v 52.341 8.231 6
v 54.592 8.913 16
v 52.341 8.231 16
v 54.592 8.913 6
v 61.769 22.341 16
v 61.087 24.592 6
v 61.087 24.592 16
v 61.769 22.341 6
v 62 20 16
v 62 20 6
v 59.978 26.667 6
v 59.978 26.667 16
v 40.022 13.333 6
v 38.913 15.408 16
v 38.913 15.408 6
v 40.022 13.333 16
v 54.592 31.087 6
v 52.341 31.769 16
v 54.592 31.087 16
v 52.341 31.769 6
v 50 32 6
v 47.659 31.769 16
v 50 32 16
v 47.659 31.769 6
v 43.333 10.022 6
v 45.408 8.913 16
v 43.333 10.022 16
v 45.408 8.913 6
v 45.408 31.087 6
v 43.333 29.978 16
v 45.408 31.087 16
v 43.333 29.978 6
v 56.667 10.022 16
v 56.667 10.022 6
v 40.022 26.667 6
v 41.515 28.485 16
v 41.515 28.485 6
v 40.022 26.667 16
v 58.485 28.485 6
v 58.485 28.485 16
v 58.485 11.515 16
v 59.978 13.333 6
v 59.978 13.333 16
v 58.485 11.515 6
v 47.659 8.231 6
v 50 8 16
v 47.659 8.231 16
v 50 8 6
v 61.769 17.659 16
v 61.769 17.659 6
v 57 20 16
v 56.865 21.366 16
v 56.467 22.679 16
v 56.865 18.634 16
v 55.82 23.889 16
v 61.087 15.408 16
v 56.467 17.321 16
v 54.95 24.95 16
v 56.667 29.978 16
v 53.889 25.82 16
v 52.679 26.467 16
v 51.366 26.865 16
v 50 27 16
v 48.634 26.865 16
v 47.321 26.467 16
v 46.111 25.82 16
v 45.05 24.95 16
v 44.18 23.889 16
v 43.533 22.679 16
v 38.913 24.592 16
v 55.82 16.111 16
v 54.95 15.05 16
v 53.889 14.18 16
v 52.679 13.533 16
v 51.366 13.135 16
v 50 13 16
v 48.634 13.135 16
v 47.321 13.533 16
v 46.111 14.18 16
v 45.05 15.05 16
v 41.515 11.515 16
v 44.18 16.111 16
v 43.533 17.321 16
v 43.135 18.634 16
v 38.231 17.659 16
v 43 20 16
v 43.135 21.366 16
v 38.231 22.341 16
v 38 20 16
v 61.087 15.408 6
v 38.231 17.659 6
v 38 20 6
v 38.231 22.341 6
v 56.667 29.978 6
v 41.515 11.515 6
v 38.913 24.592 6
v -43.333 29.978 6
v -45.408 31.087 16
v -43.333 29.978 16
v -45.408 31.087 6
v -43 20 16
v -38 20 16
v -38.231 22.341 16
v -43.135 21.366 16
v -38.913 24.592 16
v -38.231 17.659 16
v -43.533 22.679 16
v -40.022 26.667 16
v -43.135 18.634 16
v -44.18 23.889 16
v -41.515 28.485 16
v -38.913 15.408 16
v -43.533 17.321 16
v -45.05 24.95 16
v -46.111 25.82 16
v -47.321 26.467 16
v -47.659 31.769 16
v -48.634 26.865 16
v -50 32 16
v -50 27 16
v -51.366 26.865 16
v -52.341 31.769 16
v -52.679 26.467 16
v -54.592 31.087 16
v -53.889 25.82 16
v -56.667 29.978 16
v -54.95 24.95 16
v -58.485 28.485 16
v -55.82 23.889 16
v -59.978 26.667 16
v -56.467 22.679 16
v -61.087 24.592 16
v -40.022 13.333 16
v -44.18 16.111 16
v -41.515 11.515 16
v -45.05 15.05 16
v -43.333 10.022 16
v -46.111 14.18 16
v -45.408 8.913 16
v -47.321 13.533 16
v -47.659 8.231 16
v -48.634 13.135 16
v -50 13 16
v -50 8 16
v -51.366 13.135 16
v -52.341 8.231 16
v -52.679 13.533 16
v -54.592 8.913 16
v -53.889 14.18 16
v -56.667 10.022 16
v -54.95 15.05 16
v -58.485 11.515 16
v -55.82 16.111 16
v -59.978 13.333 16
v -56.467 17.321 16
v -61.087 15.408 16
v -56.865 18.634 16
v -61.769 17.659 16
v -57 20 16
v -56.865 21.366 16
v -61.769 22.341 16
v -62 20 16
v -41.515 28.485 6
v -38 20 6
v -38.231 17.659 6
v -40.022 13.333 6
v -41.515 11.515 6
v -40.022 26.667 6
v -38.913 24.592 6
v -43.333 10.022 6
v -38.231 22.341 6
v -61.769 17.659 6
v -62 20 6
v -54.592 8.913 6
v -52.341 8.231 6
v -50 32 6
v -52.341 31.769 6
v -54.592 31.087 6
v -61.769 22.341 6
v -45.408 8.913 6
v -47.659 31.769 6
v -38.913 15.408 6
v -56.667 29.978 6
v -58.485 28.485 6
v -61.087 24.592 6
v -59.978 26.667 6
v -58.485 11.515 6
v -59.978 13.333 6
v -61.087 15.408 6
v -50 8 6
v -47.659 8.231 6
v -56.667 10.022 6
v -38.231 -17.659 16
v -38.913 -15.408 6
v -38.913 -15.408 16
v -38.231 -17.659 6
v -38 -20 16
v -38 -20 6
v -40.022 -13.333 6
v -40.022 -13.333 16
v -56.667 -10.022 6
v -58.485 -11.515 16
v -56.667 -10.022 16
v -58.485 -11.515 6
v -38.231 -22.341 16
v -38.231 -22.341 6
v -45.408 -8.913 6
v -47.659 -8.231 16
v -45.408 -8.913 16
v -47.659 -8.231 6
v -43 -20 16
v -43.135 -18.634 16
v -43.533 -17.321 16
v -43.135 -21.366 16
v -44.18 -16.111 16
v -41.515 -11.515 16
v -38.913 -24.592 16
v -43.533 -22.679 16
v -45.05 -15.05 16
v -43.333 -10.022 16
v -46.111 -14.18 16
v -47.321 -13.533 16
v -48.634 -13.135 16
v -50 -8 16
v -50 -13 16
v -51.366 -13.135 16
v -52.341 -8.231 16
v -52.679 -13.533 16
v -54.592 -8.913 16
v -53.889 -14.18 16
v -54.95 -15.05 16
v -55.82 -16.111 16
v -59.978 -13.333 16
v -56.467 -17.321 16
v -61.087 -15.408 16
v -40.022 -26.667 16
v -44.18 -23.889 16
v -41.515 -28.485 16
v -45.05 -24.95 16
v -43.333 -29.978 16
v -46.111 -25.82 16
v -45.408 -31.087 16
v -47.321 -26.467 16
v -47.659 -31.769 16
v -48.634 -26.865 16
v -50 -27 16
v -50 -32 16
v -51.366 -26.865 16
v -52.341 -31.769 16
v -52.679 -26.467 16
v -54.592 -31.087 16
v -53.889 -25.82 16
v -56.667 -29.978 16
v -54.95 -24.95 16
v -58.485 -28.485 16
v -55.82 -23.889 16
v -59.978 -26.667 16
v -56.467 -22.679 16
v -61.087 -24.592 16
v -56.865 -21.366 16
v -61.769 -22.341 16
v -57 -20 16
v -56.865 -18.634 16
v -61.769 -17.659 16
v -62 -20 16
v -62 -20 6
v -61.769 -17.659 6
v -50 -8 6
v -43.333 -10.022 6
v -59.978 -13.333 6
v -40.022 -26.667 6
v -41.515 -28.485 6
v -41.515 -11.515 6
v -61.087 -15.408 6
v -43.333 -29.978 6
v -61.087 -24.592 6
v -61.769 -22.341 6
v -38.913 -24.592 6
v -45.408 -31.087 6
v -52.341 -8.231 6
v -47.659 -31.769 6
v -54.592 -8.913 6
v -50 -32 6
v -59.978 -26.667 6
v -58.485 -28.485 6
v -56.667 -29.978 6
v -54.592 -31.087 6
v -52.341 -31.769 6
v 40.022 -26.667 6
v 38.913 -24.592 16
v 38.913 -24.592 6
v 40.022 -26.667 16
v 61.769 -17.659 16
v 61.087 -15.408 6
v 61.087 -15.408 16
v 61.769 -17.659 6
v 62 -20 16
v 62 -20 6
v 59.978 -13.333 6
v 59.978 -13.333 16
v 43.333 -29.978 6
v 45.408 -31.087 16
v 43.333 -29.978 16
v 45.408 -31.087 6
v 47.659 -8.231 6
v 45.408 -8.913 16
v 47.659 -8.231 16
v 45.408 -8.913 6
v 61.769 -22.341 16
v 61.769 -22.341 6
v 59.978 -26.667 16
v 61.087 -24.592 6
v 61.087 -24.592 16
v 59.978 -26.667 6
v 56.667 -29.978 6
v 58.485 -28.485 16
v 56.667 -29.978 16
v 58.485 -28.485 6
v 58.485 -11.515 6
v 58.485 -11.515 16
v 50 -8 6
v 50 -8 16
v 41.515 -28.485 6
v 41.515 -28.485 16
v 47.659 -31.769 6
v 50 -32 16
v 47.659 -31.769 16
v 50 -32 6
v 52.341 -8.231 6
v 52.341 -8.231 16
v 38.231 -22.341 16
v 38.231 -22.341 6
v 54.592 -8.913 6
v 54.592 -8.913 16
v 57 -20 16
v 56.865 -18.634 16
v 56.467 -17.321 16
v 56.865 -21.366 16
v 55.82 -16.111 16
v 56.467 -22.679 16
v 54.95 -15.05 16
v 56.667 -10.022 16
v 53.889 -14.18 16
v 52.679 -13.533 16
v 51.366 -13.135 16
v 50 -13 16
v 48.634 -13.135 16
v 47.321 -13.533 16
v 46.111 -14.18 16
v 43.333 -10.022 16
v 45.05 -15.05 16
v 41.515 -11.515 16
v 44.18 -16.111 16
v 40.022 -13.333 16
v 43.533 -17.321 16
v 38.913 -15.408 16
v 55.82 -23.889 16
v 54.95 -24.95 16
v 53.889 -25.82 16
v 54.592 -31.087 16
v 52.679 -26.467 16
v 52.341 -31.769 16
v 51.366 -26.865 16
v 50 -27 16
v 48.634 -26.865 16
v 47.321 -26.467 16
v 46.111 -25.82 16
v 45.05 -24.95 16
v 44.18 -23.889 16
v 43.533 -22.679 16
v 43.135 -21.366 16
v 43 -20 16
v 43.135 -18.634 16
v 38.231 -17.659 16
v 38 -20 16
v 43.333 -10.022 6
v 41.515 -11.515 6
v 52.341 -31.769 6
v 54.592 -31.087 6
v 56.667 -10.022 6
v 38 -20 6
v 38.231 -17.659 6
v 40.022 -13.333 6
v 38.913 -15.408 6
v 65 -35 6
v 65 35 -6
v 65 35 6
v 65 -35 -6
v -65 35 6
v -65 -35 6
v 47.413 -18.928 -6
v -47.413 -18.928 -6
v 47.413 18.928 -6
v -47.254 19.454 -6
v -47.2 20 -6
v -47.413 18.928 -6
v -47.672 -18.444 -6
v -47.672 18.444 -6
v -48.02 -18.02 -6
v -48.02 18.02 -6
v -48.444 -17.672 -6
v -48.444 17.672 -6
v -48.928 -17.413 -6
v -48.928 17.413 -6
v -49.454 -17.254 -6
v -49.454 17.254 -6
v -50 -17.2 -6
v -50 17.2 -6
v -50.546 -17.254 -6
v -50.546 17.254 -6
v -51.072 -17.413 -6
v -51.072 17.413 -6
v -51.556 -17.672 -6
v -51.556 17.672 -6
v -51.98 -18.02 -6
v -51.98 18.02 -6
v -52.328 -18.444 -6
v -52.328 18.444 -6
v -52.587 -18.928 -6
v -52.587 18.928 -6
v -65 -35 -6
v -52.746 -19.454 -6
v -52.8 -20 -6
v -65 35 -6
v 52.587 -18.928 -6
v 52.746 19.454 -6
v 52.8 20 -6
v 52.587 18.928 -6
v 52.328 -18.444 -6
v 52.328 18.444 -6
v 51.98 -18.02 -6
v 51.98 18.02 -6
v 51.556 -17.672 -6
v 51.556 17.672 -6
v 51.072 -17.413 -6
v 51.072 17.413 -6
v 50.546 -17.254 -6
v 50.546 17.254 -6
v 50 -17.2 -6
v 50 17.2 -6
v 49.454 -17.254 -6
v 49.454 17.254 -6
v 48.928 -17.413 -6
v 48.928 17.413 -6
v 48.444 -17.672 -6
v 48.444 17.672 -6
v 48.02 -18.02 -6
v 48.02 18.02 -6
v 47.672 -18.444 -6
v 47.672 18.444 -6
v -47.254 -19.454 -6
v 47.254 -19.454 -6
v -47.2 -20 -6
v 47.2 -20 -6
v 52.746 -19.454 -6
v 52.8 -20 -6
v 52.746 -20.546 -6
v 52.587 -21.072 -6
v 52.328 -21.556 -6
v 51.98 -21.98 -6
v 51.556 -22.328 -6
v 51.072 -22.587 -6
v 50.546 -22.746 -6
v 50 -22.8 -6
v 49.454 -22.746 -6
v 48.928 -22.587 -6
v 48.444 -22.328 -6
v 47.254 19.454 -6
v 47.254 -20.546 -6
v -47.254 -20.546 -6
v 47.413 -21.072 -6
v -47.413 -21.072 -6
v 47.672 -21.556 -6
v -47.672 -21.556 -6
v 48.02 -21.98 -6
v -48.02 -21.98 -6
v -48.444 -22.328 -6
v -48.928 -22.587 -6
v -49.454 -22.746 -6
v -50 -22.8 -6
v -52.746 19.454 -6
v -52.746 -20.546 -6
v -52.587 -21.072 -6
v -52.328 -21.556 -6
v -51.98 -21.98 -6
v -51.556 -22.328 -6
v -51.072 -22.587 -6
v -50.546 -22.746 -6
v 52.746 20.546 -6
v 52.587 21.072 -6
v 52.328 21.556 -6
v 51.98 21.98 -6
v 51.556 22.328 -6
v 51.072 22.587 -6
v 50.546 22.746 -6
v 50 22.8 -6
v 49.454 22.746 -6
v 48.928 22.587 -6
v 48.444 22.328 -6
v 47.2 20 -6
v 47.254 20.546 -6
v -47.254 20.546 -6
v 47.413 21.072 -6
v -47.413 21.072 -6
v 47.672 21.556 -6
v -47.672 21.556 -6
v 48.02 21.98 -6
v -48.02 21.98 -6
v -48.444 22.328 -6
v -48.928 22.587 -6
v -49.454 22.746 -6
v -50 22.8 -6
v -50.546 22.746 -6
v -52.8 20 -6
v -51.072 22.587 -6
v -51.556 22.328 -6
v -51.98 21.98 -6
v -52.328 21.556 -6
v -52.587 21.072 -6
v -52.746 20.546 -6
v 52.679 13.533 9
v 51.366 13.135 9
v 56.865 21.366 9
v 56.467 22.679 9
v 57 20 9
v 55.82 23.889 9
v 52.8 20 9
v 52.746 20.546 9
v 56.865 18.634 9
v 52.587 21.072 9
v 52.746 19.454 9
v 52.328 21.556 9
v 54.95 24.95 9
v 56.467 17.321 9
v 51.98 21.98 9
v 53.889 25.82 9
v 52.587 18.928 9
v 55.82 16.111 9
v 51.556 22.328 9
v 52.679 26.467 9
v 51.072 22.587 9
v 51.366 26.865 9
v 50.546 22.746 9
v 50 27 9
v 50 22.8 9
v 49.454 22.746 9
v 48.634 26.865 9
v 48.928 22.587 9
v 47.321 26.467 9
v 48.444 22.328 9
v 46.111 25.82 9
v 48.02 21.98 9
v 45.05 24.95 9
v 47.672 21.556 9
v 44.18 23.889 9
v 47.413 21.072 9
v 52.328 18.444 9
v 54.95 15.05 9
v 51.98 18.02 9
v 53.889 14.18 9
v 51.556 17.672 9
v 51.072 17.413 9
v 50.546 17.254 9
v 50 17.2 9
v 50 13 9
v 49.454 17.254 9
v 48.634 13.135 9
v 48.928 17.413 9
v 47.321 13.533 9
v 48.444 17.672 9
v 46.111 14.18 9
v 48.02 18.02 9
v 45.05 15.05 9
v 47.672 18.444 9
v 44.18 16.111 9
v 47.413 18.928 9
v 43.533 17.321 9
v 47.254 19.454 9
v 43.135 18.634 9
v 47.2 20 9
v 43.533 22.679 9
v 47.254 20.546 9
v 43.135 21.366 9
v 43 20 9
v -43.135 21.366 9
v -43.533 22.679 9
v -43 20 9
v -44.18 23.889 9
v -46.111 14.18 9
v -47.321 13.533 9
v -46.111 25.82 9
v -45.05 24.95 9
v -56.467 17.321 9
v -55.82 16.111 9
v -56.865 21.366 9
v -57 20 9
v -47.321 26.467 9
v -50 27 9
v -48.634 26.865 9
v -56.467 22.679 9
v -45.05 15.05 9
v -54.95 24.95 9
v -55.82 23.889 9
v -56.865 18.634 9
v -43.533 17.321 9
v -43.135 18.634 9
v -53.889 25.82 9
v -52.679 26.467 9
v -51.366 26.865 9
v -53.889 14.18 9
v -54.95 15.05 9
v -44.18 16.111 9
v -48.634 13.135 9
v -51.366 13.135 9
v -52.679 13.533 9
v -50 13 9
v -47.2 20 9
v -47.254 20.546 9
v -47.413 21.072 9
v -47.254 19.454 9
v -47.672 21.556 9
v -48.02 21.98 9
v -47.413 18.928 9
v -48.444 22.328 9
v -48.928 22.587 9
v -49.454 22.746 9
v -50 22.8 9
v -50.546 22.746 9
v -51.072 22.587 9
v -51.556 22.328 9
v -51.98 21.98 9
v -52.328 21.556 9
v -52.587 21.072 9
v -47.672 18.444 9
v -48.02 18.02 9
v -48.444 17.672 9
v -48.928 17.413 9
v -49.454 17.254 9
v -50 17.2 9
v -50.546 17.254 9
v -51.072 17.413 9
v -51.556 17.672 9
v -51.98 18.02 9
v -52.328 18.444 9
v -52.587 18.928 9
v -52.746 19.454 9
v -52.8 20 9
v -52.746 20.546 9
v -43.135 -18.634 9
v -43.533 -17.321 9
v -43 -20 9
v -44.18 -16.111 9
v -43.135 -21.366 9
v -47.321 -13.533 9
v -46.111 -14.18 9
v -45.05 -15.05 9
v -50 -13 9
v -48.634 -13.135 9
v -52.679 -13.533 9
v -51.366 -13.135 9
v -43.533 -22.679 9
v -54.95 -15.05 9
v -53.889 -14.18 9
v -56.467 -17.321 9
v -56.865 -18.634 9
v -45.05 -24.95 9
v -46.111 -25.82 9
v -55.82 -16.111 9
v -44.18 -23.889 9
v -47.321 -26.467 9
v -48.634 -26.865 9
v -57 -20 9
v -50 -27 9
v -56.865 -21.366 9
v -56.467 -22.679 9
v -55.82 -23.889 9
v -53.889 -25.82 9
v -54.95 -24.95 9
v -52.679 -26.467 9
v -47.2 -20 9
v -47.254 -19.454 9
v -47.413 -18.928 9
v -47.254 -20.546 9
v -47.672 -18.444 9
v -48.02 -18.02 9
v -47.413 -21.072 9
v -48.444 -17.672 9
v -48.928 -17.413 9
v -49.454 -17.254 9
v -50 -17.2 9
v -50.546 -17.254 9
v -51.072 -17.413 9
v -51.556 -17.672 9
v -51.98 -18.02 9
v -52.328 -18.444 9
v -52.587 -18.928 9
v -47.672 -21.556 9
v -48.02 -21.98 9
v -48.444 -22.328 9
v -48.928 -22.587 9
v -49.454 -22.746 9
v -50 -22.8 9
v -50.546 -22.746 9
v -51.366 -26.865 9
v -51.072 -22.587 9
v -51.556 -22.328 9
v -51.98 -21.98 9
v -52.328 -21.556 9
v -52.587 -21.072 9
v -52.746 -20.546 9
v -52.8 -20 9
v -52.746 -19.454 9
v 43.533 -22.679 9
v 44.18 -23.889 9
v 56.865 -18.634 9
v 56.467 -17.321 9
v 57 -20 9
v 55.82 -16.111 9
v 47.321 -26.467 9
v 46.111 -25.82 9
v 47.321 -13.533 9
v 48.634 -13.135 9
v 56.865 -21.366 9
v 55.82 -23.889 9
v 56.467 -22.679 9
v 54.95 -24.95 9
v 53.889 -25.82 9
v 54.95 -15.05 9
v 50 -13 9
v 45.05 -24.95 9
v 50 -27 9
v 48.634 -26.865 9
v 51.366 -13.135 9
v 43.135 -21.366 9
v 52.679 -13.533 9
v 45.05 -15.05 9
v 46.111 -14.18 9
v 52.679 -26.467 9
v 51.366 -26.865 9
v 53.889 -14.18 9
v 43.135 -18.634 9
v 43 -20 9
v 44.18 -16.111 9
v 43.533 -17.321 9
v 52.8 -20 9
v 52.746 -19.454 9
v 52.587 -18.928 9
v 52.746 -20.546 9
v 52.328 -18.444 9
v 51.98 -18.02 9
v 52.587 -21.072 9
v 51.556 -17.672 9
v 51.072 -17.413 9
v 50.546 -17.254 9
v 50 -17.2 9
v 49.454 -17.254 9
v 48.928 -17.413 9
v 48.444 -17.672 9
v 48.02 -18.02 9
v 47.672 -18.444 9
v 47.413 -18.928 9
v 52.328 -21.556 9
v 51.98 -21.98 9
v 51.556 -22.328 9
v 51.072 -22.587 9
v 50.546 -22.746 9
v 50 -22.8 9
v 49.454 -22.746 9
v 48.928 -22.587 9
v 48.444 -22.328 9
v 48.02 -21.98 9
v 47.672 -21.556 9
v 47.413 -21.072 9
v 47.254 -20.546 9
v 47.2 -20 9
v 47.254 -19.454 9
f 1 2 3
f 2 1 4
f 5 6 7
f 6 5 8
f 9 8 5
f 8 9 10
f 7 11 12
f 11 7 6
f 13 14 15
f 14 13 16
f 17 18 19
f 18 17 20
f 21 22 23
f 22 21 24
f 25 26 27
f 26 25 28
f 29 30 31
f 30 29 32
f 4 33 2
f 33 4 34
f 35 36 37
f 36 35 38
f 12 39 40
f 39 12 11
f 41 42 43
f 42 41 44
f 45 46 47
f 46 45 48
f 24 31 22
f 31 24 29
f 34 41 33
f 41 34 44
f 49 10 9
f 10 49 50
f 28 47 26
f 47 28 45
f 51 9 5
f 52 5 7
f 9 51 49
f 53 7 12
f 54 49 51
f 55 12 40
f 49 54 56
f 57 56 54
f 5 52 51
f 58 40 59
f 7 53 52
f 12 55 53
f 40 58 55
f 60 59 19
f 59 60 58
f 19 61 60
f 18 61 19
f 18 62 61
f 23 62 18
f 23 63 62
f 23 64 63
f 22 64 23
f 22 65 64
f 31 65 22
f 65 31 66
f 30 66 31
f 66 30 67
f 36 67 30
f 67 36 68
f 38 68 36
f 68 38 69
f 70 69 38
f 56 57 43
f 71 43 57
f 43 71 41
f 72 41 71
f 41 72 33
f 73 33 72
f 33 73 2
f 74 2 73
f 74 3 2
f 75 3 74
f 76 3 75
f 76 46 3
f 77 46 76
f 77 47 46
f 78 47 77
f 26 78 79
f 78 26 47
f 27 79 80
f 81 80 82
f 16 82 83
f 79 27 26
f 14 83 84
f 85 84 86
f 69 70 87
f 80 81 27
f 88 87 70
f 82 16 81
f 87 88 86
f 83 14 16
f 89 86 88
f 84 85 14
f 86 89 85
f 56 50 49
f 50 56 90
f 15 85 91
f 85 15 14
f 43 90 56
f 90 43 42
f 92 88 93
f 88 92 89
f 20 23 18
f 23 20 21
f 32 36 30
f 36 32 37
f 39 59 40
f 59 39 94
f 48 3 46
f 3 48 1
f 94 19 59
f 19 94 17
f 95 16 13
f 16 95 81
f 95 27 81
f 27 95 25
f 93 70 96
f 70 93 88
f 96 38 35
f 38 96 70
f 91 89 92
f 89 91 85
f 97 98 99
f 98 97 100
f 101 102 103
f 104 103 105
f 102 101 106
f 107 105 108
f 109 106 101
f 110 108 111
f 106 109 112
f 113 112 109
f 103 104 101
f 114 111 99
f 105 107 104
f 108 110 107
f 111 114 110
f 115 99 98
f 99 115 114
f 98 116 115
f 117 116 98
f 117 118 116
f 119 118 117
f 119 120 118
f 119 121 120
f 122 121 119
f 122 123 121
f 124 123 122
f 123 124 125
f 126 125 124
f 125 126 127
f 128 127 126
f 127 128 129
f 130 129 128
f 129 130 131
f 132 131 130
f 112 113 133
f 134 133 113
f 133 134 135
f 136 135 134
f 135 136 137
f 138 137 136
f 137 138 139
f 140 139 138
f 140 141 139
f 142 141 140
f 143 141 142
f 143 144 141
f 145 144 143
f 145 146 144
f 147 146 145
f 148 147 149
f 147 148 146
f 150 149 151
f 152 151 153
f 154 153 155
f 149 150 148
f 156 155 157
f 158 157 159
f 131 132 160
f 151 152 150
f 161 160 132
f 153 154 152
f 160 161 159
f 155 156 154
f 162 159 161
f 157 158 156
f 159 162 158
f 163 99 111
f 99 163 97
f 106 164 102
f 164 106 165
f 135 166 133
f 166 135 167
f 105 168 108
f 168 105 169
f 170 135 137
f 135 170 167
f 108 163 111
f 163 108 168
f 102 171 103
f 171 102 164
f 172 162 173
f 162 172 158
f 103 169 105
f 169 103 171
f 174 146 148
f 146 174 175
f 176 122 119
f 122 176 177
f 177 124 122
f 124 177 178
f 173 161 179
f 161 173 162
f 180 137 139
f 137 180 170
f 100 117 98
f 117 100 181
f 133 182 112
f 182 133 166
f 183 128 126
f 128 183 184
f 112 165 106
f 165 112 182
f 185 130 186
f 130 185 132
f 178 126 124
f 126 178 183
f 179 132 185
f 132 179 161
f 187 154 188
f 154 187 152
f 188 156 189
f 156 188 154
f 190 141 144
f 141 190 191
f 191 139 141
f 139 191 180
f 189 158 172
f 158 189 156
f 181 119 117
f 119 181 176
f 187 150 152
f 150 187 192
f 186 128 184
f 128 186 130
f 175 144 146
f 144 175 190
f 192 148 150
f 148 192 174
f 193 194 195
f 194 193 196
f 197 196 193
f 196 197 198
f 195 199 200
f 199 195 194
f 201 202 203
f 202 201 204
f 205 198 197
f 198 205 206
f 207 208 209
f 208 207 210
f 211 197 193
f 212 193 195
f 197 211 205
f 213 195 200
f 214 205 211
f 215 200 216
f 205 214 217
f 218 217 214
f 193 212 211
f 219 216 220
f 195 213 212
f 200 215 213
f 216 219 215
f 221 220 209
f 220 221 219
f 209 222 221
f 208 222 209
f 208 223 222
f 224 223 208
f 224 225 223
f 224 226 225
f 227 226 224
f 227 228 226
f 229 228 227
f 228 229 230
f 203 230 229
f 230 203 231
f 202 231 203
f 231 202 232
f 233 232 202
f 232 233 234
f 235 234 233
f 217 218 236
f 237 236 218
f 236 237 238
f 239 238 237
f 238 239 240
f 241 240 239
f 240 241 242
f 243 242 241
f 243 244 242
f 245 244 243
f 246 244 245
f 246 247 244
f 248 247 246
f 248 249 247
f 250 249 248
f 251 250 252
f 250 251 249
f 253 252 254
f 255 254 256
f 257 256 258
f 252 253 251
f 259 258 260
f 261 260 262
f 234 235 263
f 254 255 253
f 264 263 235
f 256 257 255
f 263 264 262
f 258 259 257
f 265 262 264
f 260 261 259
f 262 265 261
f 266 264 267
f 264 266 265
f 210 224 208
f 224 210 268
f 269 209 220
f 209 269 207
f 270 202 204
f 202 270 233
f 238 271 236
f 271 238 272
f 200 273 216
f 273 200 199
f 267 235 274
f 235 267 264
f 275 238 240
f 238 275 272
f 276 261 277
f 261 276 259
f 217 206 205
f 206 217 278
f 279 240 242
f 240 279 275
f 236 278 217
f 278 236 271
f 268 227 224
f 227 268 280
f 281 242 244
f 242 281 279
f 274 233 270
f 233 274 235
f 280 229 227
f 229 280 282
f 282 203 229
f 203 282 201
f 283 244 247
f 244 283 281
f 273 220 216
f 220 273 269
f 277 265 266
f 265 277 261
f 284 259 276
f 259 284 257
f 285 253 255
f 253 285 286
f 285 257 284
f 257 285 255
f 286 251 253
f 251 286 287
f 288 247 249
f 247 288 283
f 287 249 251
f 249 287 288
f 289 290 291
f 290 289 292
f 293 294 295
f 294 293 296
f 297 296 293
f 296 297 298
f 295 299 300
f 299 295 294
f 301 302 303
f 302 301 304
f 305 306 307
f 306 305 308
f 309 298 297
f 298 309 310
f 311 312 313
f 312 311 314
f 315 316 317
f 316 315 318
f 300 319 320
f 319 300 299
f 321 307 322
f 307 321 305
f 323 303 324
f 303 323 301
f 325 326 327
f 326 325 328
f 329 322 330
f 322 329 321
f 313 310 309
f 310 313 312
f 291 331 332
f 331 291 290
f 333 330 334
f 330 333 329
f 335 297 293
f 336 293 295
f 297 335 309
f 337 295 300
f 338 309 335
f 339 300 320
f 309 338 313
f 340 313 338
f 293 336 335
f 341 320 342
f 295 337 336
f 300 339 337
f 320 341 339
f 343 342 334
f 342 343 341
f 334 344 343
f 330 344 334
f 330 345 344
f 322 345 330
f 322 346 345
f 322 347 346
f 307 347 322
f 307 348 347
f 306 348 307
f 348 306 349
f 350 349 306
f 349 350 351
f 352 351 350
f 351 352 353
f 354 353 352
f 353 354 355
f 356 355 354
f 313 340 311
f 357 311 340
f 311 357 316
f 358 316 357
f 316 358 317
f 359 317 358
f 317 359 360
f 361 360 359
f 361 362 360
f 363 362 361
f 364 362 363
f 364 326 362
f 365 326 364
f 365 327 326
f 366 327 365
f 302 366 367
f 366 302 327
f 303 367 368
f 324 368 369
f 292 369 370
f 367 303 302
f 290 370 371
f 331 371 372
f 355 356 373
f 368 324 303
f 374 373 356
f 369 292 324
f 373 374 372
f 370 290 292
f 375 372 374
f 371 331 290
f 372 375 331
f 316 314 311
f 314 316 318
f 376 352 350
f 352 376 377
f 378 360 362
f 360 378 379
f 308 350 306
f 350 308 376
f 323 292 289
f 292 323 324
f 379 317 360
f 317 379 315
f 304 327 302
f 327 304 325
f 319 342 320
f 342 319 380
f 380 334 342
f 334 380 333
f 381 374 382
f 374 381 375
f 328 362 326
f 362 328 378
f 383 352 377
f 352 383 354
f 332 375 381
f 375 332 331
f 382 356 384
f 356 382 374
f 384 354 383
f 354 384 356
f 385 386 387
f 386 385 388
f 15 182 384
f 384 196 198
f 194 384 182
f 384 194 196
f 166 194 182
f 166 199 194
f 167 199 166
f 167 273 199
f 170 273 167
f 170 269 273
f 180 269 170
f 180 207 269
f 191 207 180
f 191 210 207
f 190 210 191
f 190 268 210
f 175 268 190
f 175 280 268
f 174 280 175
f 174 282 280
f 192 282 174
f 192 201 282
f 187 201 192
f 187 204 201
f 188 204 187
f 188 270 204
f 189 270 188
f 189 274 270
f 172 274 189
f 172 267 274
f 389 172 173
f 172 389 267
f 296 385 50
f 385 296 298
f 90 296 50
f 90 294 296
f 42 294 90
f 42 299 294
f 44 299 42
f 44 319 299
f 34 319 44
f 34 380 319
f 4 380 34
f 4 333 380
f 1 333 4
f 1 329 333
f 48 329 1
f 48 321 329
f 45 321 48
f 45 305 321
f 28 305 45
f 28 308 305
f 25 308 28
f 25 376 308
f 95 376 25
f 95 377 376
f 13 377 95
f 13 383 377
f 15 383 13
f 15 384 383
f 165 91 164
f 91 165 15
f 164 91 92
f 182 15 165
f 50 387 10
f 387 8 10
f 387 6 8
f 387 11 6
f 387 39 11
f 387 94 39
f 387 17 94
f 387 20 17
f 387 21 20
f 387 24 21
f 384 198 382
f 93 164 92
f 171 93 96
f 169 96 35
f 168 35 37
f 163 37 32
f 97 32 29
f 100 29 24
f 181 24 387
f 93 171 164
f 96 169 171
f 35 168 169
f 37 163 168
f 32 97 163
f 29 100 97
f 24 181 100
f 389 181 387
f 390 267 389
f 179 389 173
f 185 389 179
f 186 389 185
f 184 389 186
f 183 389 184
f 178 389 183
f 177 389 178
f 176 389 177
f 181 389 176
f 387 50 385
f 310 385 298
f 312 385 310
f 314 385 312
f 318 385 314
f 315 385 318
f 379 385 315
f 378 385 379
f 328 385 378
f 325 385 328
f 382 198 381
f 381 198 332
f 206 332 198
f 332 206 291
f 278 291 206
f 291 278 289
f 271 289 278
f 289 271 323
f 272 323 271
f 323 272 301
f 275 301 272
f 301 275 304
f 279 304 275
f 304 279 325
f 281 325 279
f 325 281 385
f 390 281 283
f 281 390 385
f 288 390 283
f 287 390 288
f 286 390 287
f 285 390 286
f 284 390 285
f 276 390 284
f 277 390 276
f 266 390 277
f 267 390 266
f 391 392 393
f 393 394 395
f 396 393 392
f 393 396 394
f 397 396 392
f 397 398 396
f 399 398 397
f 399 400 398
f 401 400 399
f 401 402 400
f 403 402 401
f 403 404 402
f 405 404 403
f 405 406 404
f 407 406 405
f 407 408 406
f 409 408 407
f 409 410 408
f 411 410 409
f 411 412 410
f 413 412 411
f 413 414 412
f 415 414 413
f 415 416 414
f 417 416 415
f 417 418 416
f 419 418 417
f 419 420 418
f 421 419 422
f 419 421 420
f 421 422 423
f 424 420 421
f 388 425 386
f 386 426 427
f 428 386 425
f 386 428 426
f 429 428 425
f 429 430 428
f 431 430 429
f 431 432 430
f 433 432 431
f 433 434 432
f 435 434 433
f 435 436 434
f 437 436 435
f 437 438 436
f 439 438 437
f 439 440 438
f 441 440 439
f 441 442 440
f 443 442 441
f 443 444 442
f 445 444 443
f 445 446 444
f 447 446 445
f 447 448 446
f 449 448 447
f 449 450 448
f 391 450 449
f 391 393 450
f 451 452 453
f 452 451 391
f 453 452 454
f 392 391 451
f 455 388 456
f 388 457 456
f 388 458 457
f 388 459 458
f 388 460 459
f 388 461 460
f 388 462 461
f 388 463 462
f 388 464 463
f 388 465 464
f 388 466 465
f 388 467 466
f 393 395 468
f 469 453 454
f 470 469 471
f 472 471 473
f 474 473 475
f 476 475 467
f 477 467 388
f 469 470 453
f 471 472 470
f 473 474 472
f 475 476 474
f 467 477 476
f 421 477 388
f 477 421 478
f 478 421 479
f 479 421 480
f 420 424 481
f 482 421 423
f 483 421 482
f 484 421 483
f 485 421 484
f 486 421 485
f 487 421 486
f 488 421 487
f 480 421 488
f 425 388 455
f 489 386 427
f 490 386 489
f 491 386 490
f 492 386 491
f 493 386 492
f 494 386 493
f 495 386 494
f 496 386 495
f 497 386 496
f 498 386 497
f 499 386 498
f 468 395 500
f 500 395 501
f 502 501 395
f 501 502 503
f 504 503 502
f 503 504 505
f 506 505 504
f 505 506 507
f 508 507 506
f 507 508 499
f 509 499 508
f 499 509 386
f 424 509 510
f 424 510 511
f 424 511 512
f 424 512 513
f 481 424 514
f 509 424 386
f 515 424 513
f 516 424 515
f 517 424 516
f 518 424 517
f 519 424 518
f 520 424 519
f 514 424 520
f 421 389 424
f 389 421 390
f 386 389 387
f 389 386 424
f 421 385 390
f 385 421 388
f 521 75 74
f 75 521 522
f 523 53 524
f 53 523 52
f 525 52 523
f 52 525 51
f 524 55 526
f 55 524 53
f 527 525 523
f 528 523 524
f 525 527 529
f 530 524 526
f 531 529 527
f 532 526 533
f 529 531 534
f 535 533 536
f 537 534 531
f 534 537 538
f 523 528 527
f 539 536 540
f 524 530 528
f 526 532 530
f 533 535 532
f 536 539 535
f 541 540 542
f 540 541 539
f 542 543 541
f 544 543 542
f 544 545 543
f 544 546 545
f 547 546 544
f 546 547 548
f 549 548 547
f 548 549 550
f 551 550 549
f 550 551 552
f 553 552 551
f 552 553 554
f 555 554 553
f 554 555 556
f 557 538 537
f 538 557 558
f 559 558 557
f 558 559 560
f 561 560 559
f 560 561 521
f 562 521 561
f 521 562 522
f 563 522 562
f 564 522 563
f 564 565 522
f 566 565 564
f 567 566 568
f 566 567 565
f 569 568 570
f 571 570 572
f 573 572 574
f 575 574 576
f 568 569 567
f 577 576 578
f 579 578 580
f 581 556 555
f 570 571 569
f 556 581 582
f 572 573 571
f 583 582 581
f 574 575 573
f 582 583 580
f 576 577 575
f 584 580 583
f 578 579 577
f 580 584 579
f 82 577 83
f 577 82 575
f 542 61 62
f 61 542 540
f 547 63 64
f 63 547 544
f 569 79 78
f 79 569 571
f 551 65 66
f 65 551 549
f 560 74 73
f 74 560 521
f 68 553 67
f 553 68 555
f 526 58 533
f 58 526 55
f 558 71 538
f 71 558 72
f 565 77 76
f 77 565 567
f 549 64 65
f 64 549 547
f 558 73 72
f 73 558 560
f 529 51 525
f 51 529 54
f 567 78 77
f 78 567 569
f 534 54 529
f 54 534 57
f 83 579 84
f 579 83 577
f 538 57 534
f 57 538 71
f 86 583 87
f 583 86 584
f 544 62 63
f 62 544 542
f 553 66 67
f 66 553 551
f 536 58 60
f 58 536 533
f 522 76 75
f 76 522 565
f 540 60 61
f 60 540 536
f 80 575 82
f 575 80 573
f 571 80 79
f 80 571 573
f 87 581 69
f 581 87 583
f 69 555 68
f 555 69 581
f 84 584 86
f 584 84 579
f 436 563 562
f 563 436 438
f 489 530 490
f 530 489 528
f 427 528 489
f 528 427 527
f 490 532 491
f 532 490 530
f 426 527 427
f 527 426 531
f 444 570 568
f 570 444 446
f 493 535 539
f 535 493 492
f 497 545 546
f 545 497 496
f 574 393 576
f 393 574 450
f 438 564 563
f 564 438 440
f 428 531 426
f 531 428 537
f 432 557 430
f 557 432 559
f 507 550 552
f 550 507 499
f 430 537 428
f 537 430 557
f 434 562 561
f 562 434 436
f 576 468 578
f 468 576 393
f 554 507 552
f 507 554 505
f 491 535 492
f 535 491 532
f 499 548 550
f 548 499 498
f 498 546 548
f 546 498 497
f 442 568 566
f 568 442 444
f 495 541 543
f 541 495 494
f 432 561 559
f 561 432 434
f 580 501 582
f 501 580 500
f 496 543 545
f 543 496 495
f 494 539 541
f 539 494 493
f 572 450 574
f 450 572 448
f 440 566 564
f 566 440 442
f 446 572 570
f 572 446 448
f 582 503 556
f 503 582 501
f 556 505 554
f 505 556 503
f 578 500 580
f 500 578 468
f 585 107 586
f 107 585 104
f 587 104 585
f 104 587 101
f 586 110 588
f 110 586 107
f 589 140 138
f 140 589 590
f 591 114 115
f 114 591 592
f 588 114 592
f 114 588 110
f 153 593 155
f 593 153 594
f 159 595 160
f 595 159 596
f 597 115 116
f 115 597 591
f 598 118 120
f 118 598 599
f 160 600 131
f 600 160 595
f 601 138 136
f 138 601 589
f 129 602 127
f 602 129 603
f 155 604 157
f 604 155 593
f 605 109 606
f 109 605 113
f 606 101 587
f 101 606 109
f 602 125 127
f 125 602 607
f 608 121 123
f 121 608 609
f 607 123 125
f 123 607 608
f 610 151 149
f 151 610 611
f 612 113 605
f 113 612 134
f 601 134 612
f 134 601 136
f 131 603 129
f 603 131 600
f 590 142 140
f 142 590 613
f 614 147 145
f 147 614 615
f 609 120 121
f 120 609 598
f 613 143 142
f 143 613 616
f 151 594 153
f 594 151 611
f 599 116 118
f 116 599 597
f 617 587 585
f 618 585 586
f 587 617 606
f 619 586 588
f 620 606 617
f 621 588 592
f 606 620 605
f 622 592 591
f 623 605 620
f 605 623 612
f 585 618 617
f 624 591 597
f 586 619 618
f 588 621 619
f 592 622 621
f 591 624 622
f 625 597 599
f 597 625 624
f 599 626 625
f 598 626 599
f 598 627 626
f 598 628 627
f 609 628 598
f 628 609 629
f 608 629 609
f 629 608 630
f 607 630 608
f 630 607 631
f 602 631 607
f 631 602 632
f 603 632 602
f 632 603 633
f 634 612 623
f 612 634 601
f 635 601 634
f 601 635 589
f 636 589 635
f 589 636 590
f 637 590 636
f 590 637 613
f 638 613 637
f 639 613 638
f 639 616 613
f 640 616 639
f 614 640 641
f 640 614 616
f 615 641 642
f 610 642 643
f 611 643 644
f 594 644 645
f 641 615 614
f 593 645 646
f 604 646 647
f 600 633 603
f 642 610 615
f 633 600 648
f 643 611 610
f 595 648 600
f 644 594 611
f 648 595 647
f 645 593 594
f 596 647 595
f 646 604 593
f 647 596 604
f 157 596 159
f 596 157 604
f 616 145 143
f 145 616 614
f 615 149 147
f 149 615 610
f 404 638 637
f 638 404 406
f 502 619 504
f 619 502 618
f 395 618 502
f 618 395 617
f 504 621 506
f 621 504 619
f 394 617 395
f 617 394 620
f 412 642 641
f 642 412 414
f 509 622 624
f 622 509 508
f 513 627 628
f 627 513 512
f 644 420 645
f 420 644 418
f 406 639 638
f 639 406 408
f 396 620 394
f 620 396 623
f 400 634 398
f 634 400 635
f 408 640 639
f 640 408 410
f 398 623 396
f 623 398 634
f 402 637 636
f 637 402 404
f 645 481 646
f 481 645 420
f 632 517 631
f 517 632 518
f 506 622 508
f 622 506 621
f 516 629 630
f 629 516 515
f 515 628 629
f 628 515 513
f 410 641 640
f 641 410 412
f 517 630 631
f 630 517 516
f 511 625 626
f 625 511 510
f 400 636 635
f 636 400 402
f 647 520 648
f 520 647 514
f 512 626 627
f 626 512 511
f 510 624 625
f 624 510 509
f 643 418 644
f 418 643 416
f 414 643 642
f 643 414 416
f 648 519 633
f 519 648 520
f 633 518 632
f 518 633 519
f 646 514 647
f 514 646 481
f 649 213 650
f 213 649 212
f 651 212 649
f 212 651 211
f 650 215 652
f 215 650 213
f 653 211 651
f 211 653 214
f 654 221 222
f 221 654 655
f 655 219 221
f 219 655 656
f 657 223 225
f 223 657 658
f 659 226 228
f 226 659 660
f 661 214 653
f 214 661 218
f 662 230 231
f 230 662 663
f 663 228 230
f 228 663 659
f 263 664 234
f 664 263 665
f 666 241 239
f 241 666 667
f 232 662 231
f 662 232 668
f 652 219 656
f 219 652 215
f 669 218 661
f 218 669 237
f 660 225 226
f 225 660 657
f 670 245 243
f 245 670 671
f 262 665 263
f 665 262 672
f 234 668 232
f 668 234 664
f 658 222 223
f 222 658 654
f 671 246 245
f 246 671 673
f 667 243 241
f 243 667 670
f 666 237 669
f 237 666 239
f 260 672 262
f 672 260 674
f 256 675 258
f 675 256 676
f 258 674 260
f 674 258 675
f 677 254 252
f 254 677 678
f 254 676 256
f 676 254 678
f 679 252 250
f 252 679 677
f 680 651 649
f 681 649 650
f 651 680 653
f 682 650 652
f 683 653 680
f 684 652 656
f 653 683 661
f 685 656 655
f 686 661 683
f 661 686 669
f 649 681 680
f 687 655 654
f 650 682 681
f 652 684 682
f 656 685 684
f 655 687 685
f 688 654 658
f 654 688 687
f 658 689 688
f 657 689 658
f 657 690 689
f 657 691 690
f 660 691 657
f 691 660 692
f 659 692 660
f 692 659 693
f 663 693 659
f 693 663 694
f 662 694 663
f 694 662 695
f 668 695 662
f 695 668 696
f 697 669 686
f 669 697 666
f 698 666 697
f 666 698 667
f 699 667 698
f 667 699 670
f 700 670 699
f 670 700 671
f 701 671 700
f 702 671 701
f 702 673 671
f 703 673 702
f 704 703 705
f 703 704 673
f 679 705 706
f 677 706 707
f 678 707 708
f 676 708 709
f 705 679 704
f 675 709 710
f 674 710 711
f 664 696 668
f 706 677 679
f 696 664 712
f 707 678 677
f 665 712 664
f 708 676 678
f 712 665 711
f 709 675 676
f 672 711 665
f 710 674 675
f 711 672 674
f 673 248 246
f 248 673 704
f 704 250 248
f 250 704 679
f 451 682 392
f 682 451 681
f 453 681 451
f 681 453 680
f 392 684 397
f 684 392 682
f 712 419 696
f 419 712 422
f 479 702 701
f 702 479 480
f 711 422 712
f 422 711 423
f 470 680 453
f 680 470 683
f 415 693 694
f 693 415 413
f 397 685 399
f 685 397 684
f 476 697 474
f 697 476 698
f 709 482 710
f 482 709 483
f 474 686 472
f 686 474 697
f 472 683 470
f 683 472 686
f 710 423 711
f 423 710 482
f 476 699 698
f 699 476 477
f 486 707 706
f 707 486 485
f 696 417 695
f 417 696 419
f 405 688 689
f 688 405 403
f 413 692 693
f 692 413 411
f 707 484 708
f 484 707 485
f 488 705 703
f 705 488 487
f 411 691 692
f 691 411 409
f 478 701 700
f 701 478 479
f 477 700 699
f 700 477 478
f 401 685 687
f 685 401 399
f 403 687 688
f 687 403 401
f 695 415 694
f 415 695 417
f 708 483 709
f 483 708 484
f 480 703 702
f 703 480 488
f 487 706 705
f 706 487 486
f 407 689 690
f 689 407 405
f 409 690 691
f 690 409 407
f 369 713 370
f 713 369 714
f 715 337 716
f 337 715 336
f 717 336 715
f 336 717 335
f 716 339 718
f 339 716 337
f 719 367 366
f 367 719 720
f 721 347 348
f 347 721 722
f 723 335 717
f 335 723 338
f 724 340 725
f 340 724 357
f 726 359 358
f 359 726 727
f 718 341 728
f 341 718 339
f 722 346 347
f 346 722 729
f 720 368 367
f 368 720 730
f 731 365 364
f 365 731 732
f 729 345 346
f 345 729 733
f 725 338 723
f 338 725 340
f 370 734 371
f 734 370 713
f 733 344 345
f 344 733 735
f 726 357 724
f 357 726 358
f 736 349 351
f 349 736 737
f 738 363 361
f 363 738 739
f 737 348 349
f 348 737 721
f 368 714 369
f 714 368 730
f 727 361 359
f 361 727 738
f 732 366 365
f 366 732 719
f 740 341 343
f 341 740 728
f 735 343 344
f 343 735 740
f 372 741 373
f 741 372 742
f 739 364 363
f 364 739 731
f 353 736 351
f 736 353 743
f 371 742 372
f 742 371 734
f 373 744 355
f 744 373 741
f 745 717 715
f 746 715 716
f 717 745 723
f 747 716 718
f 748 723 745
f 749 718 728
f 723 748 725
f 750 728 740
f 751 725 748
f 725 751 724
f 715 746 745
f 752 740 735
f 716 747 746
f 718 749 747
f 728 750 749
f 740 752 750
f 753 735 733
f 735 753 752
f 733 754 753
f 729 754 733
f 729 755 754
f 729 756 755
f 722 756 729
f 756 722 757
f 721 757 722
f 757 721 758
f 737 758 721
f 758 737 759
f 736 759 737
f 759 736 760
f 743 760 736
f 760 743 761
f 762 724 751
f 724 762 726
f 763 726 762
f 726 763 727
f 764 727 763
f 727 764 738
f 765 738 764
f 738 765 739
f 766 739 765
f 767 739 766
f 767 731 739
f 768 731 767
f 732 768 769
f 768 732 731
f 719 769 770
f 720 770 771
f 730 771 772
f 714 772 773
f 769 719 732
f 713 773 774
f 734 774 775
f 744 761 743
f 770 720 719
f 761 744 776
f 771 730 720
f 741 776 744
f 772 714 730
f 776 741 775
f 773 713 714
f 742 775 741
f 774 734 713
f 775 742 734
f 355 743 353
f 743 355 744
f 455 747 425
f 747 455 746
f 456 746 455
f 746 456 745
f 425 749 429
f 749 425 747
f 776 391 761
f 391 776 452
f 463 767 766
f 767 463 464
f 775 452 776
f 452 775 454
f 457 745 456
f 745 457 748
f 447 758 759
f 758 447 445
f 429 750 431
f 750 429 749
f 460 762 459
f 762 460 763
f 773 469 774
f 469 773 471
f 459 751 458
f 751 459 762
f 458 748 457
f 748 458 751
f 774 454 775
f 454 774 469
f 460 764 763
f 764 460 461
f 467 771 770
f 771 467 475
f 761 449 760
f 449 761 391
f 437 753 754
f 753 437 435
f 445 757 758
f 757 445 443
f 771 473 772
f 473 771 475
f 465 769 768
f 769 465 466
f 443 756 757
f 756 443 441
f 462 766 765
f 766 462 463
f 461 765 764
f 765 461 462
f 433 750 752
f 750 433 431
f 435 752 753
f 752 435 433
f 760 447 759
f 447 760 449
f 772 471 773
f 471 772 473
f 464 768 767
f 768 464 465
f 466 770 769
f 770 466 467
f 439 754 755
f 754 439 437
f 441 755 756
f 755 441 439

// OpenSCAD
$fn = 32;

// ----------------------------------------------------------------------
// Socket pad plate
// bosses with counterbored sockets for the screws
// ----------------------------------------------------------------------

// --- parameters (mm) ---
base_t = 12;            // base plate thickness
boss_h = 10;            // boss height above the base plate
boss_d = 24;            // boss diameter
socket_d = 14;          // socket diameter
socket_depth = 7;       // socket depth from the boss face
bolt_d = 5.6;           // screw clearance hole through the socket floor
plate = [130, 70, 12];  // overall size (x, y, z)
edge = 15;              // boss centre offset from the plate edge
pads = 4;               // boss count, one per corner

// --- derived feature positions (mm) ---
height = base_t + boss_h;        // = 22   overall height of the part
corner_x = plate[0] / 2 - edge;  // = 50   boss centre X
corner_y = plate[1] / 2 - edge;  // = 20   boss centre Y
feature_centers = [
  [corner_x, corner_y],
  [-corner_x, corner_y],
  [-corner_x, -corner_y],
  [corner_x, -corner_y]
];   // boss centres: sockets, holes and the pads themselves are placed from here

// base plate, bosses on feature_centers, socket + through hole in each
difference() {
  union() {
    cube(plate, center = true);
    for (centre = feature_centers)
      translate([centre[0], centre[1], plate[2] / 2 - 1])
        cylinder(d = boss_d, h = boss_h + 1);
  }
  for (centre = feature_centers) {
    translate([centre[0], centre[1], plate[2] / 2 + boss_h - socket_depth])
      cylinder(d = socket_d, h = socket_depth + 1);
    translate([centre[0], centre[1], -height])
      cylinder(d = bolt_d, h = 2 * height + 2);  // through the socket floor
  }
}
